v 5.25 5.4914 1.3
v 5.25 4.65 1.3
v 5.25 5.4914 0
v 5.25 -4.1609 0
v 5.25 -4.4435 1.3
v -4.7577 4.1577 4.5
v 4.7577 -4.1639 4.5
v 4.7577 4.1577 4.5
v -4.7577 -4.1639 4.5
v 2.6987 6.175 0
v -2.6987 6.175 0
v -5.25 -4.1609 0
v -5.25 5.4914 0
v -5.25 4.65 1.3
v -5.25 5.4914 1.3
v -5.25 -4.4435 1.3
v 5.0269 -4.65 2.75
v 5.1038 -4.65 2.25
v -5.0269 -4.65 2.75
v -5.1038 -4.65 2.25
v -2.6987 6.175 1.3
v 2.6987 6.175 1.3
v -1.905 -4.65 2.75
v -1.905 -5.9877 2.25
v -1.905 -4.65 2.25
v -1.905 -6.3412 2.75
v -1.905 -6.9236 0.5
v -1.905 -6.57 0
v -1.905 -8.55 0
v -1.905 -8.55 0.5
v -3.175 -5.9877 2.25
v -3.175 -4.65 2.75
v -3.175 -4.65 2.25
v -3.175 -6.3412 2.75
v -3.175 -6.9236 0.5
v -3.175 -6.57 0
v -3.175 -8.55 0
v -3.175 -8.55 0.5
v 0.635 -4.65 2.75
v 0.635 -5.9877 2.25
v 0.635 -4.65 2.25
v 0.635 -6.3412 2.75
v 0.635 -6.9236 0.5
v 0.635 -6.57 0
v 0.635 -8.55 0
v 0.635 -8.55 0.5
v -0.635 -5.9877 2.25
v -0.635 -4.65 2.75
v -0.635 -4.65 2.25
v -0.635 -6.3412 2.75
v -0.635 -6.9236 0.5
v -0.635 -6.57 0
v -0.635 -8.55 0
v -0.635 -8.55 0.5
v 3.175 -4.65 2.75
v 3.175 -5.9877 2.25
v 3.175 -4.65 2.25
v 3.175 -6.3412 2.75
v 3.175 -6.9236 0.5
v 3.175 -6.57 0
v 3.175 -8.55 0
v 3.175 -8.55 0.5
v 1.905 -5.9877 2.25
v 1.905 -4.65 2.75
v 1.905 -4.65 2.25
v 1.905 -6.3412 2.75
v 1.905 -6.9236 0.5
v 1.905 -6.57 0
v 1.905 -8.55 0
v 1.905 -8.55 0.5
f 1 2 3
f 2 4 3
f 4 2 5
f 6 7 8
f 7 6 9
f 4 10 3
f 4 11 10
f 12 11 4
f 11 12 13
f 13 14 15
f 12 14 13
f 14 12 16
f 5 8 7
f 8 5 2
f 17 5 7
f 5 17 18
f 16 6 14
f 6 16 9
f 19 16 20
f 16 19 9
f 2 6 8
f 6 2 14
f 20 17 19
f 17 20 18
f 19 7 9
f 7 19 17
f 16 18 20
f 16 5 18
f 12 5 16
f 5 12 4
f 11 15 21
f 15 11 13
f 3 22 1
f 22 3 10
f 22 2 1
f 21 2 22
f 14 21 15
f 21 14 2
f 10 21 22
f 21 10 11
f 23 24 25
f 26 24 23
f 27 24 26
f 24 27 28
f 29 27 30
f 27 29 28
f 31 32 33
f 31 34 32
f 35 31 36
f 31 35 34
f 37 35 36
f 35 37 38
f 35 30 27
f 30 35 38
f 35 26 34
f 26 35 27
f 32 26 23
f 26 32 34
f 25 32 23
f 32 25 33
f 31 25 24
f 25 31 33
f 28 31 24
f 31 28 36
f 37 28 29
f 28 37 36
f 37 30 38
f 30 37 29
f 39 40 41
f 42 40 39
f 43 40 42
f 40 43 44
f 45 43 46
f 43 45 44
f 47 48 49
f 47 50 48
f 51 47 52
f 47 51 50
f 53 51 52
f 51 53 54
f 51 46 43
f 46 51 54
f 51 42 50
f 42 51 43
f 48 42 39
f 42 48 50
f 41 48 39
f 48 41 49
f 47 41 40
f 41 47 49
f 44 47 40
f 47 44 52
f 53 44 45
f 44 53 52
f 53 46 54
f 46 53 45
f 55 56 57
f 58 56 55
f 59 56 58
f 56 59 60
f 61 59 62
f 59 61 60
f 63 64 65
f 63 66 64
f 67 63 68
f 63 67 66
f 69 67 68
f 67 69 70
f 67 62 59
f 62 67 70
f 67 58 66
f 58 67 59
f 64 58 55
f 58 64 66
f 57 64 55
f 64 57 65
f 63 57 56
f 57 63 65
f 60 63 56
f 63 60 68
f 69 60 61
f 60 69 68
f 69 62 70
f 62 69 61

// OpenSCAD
body_width = 10.5;
body_width_chamfer = 0.5;

body_length = 9.3;
body_length_chamfer = 0.5;

body_height = 4.5;

tab_length = 1.525;
tab_chamfer_angle = 15;
tab_chamfer_offset = 0.75;
tab_height = 1.3;

pin_pitch = 2.54;
pin_length = 3.9;
pin_width = 1.27;
pin_seating = 1.98;
pin_gull_angle = 15;
leadframe_height = 2.5;
leadframe_thickness = 0.5;

overall_width = body_width + 2*pin_length;


color("#111") difference() {
    translate([0, 0, body_height/2]) cube([body_width, body_length, body_height], center = true);
    
    rotate([90, 0, 0]) linear_extrude(center = true, convexity = 2) {
        polygon([
            [body_width/2, tab_height],
            [body_width/2 - body_width_chamfer, body_height + 0.05],
            [body_width, body_height + 0.05],
            [body_width, tab_height],
        ]);
        polygon([
            [-body_width/2, tab_height],
            [-body_width/2 + body_width_chamfer, body_height + 0.05],
            [-body_width, body_height + 0.05],
            [-body_width, tab_height],
        ]);
    }
    
    rotate([90, 0, 90]) linear_extrude(center = true, convexity = 2) {
        polygon([
            [body_length/2, tab_height],
            [body_length/2 - body_length_chamfer, body_height + 0.05],
            [body_length, body_height + 0.05],
            [body_length, tab_height],
        ]);
        polygon([
            [-body_length/2 + body_length_chamfer, -0.05],
            [-body_length/2, leadframe_height - leadframe_thickness/2],
            [-body_length/2, leadframe_height + leadframe_thickness/2],
            [-body_length/2 + body_width_chamfer, body_height + 0.05],
            [-body_length, body_height + 0.05],
            [-body_length, -0.05],
        ]);    
    }
}

color("#aaa") {
    // tab
    difference() {
        translate([0, body_length/2 + tab_length/2, tab_height/2]) cube([body_width, tab_length, tab_height], center = true);
        translate([0, body_length/2 + tab_length*1.5 + tab_chamfer_offset, tab_height/2]) {
            rotate([0, 0, tab_chamfer_angle]) cube([body_width*1.5, tab_length, tab_height * 2], center = true);
            rotate([0, 0, -tab_chamfer_angle]) cube([body_width*1.5, tab_length, tab_height * 2], center = true);
        }
    }
    
    // pins
    translate([0, -body_length/2 - pin_length, 0]) for (p = [-1 : 1]) translate([pin_pitch * p, 0, 0]) {
        rotate([0, 0, 180]) pin();
    }
}

module pin() {
    rotate([90, 0, 90]) linear_extrude(height = pin_width, center = true) {
        gull_offset = leadframe_height - leadframe_thickness / 2;
        pin_length = (overall_width - body_width) / 2;
        sine = sin(pin_gull_angle);
        cosine = cos(pin_gull_angle);
        polygon([
            [0, 0],
            [-pin_seating, 0],
            [-pin_seating - sine * gull_offset, gull_offset],
            [-pin_length, gull_offset],
            [-pin_length, gull_offset + leadframe_thickness],
            [-pin_seating - sine * (gull_offset + leadframe_thickness) + cosine * leadframe_thickness, gull_offset + leadframe_thickness],
            [-pin_seating - sine * leadframe_thickness + cosine * leadframe_thickness, leadframe_thickness],
            [0, leadframe_thickness],
        ]);
    }
}
